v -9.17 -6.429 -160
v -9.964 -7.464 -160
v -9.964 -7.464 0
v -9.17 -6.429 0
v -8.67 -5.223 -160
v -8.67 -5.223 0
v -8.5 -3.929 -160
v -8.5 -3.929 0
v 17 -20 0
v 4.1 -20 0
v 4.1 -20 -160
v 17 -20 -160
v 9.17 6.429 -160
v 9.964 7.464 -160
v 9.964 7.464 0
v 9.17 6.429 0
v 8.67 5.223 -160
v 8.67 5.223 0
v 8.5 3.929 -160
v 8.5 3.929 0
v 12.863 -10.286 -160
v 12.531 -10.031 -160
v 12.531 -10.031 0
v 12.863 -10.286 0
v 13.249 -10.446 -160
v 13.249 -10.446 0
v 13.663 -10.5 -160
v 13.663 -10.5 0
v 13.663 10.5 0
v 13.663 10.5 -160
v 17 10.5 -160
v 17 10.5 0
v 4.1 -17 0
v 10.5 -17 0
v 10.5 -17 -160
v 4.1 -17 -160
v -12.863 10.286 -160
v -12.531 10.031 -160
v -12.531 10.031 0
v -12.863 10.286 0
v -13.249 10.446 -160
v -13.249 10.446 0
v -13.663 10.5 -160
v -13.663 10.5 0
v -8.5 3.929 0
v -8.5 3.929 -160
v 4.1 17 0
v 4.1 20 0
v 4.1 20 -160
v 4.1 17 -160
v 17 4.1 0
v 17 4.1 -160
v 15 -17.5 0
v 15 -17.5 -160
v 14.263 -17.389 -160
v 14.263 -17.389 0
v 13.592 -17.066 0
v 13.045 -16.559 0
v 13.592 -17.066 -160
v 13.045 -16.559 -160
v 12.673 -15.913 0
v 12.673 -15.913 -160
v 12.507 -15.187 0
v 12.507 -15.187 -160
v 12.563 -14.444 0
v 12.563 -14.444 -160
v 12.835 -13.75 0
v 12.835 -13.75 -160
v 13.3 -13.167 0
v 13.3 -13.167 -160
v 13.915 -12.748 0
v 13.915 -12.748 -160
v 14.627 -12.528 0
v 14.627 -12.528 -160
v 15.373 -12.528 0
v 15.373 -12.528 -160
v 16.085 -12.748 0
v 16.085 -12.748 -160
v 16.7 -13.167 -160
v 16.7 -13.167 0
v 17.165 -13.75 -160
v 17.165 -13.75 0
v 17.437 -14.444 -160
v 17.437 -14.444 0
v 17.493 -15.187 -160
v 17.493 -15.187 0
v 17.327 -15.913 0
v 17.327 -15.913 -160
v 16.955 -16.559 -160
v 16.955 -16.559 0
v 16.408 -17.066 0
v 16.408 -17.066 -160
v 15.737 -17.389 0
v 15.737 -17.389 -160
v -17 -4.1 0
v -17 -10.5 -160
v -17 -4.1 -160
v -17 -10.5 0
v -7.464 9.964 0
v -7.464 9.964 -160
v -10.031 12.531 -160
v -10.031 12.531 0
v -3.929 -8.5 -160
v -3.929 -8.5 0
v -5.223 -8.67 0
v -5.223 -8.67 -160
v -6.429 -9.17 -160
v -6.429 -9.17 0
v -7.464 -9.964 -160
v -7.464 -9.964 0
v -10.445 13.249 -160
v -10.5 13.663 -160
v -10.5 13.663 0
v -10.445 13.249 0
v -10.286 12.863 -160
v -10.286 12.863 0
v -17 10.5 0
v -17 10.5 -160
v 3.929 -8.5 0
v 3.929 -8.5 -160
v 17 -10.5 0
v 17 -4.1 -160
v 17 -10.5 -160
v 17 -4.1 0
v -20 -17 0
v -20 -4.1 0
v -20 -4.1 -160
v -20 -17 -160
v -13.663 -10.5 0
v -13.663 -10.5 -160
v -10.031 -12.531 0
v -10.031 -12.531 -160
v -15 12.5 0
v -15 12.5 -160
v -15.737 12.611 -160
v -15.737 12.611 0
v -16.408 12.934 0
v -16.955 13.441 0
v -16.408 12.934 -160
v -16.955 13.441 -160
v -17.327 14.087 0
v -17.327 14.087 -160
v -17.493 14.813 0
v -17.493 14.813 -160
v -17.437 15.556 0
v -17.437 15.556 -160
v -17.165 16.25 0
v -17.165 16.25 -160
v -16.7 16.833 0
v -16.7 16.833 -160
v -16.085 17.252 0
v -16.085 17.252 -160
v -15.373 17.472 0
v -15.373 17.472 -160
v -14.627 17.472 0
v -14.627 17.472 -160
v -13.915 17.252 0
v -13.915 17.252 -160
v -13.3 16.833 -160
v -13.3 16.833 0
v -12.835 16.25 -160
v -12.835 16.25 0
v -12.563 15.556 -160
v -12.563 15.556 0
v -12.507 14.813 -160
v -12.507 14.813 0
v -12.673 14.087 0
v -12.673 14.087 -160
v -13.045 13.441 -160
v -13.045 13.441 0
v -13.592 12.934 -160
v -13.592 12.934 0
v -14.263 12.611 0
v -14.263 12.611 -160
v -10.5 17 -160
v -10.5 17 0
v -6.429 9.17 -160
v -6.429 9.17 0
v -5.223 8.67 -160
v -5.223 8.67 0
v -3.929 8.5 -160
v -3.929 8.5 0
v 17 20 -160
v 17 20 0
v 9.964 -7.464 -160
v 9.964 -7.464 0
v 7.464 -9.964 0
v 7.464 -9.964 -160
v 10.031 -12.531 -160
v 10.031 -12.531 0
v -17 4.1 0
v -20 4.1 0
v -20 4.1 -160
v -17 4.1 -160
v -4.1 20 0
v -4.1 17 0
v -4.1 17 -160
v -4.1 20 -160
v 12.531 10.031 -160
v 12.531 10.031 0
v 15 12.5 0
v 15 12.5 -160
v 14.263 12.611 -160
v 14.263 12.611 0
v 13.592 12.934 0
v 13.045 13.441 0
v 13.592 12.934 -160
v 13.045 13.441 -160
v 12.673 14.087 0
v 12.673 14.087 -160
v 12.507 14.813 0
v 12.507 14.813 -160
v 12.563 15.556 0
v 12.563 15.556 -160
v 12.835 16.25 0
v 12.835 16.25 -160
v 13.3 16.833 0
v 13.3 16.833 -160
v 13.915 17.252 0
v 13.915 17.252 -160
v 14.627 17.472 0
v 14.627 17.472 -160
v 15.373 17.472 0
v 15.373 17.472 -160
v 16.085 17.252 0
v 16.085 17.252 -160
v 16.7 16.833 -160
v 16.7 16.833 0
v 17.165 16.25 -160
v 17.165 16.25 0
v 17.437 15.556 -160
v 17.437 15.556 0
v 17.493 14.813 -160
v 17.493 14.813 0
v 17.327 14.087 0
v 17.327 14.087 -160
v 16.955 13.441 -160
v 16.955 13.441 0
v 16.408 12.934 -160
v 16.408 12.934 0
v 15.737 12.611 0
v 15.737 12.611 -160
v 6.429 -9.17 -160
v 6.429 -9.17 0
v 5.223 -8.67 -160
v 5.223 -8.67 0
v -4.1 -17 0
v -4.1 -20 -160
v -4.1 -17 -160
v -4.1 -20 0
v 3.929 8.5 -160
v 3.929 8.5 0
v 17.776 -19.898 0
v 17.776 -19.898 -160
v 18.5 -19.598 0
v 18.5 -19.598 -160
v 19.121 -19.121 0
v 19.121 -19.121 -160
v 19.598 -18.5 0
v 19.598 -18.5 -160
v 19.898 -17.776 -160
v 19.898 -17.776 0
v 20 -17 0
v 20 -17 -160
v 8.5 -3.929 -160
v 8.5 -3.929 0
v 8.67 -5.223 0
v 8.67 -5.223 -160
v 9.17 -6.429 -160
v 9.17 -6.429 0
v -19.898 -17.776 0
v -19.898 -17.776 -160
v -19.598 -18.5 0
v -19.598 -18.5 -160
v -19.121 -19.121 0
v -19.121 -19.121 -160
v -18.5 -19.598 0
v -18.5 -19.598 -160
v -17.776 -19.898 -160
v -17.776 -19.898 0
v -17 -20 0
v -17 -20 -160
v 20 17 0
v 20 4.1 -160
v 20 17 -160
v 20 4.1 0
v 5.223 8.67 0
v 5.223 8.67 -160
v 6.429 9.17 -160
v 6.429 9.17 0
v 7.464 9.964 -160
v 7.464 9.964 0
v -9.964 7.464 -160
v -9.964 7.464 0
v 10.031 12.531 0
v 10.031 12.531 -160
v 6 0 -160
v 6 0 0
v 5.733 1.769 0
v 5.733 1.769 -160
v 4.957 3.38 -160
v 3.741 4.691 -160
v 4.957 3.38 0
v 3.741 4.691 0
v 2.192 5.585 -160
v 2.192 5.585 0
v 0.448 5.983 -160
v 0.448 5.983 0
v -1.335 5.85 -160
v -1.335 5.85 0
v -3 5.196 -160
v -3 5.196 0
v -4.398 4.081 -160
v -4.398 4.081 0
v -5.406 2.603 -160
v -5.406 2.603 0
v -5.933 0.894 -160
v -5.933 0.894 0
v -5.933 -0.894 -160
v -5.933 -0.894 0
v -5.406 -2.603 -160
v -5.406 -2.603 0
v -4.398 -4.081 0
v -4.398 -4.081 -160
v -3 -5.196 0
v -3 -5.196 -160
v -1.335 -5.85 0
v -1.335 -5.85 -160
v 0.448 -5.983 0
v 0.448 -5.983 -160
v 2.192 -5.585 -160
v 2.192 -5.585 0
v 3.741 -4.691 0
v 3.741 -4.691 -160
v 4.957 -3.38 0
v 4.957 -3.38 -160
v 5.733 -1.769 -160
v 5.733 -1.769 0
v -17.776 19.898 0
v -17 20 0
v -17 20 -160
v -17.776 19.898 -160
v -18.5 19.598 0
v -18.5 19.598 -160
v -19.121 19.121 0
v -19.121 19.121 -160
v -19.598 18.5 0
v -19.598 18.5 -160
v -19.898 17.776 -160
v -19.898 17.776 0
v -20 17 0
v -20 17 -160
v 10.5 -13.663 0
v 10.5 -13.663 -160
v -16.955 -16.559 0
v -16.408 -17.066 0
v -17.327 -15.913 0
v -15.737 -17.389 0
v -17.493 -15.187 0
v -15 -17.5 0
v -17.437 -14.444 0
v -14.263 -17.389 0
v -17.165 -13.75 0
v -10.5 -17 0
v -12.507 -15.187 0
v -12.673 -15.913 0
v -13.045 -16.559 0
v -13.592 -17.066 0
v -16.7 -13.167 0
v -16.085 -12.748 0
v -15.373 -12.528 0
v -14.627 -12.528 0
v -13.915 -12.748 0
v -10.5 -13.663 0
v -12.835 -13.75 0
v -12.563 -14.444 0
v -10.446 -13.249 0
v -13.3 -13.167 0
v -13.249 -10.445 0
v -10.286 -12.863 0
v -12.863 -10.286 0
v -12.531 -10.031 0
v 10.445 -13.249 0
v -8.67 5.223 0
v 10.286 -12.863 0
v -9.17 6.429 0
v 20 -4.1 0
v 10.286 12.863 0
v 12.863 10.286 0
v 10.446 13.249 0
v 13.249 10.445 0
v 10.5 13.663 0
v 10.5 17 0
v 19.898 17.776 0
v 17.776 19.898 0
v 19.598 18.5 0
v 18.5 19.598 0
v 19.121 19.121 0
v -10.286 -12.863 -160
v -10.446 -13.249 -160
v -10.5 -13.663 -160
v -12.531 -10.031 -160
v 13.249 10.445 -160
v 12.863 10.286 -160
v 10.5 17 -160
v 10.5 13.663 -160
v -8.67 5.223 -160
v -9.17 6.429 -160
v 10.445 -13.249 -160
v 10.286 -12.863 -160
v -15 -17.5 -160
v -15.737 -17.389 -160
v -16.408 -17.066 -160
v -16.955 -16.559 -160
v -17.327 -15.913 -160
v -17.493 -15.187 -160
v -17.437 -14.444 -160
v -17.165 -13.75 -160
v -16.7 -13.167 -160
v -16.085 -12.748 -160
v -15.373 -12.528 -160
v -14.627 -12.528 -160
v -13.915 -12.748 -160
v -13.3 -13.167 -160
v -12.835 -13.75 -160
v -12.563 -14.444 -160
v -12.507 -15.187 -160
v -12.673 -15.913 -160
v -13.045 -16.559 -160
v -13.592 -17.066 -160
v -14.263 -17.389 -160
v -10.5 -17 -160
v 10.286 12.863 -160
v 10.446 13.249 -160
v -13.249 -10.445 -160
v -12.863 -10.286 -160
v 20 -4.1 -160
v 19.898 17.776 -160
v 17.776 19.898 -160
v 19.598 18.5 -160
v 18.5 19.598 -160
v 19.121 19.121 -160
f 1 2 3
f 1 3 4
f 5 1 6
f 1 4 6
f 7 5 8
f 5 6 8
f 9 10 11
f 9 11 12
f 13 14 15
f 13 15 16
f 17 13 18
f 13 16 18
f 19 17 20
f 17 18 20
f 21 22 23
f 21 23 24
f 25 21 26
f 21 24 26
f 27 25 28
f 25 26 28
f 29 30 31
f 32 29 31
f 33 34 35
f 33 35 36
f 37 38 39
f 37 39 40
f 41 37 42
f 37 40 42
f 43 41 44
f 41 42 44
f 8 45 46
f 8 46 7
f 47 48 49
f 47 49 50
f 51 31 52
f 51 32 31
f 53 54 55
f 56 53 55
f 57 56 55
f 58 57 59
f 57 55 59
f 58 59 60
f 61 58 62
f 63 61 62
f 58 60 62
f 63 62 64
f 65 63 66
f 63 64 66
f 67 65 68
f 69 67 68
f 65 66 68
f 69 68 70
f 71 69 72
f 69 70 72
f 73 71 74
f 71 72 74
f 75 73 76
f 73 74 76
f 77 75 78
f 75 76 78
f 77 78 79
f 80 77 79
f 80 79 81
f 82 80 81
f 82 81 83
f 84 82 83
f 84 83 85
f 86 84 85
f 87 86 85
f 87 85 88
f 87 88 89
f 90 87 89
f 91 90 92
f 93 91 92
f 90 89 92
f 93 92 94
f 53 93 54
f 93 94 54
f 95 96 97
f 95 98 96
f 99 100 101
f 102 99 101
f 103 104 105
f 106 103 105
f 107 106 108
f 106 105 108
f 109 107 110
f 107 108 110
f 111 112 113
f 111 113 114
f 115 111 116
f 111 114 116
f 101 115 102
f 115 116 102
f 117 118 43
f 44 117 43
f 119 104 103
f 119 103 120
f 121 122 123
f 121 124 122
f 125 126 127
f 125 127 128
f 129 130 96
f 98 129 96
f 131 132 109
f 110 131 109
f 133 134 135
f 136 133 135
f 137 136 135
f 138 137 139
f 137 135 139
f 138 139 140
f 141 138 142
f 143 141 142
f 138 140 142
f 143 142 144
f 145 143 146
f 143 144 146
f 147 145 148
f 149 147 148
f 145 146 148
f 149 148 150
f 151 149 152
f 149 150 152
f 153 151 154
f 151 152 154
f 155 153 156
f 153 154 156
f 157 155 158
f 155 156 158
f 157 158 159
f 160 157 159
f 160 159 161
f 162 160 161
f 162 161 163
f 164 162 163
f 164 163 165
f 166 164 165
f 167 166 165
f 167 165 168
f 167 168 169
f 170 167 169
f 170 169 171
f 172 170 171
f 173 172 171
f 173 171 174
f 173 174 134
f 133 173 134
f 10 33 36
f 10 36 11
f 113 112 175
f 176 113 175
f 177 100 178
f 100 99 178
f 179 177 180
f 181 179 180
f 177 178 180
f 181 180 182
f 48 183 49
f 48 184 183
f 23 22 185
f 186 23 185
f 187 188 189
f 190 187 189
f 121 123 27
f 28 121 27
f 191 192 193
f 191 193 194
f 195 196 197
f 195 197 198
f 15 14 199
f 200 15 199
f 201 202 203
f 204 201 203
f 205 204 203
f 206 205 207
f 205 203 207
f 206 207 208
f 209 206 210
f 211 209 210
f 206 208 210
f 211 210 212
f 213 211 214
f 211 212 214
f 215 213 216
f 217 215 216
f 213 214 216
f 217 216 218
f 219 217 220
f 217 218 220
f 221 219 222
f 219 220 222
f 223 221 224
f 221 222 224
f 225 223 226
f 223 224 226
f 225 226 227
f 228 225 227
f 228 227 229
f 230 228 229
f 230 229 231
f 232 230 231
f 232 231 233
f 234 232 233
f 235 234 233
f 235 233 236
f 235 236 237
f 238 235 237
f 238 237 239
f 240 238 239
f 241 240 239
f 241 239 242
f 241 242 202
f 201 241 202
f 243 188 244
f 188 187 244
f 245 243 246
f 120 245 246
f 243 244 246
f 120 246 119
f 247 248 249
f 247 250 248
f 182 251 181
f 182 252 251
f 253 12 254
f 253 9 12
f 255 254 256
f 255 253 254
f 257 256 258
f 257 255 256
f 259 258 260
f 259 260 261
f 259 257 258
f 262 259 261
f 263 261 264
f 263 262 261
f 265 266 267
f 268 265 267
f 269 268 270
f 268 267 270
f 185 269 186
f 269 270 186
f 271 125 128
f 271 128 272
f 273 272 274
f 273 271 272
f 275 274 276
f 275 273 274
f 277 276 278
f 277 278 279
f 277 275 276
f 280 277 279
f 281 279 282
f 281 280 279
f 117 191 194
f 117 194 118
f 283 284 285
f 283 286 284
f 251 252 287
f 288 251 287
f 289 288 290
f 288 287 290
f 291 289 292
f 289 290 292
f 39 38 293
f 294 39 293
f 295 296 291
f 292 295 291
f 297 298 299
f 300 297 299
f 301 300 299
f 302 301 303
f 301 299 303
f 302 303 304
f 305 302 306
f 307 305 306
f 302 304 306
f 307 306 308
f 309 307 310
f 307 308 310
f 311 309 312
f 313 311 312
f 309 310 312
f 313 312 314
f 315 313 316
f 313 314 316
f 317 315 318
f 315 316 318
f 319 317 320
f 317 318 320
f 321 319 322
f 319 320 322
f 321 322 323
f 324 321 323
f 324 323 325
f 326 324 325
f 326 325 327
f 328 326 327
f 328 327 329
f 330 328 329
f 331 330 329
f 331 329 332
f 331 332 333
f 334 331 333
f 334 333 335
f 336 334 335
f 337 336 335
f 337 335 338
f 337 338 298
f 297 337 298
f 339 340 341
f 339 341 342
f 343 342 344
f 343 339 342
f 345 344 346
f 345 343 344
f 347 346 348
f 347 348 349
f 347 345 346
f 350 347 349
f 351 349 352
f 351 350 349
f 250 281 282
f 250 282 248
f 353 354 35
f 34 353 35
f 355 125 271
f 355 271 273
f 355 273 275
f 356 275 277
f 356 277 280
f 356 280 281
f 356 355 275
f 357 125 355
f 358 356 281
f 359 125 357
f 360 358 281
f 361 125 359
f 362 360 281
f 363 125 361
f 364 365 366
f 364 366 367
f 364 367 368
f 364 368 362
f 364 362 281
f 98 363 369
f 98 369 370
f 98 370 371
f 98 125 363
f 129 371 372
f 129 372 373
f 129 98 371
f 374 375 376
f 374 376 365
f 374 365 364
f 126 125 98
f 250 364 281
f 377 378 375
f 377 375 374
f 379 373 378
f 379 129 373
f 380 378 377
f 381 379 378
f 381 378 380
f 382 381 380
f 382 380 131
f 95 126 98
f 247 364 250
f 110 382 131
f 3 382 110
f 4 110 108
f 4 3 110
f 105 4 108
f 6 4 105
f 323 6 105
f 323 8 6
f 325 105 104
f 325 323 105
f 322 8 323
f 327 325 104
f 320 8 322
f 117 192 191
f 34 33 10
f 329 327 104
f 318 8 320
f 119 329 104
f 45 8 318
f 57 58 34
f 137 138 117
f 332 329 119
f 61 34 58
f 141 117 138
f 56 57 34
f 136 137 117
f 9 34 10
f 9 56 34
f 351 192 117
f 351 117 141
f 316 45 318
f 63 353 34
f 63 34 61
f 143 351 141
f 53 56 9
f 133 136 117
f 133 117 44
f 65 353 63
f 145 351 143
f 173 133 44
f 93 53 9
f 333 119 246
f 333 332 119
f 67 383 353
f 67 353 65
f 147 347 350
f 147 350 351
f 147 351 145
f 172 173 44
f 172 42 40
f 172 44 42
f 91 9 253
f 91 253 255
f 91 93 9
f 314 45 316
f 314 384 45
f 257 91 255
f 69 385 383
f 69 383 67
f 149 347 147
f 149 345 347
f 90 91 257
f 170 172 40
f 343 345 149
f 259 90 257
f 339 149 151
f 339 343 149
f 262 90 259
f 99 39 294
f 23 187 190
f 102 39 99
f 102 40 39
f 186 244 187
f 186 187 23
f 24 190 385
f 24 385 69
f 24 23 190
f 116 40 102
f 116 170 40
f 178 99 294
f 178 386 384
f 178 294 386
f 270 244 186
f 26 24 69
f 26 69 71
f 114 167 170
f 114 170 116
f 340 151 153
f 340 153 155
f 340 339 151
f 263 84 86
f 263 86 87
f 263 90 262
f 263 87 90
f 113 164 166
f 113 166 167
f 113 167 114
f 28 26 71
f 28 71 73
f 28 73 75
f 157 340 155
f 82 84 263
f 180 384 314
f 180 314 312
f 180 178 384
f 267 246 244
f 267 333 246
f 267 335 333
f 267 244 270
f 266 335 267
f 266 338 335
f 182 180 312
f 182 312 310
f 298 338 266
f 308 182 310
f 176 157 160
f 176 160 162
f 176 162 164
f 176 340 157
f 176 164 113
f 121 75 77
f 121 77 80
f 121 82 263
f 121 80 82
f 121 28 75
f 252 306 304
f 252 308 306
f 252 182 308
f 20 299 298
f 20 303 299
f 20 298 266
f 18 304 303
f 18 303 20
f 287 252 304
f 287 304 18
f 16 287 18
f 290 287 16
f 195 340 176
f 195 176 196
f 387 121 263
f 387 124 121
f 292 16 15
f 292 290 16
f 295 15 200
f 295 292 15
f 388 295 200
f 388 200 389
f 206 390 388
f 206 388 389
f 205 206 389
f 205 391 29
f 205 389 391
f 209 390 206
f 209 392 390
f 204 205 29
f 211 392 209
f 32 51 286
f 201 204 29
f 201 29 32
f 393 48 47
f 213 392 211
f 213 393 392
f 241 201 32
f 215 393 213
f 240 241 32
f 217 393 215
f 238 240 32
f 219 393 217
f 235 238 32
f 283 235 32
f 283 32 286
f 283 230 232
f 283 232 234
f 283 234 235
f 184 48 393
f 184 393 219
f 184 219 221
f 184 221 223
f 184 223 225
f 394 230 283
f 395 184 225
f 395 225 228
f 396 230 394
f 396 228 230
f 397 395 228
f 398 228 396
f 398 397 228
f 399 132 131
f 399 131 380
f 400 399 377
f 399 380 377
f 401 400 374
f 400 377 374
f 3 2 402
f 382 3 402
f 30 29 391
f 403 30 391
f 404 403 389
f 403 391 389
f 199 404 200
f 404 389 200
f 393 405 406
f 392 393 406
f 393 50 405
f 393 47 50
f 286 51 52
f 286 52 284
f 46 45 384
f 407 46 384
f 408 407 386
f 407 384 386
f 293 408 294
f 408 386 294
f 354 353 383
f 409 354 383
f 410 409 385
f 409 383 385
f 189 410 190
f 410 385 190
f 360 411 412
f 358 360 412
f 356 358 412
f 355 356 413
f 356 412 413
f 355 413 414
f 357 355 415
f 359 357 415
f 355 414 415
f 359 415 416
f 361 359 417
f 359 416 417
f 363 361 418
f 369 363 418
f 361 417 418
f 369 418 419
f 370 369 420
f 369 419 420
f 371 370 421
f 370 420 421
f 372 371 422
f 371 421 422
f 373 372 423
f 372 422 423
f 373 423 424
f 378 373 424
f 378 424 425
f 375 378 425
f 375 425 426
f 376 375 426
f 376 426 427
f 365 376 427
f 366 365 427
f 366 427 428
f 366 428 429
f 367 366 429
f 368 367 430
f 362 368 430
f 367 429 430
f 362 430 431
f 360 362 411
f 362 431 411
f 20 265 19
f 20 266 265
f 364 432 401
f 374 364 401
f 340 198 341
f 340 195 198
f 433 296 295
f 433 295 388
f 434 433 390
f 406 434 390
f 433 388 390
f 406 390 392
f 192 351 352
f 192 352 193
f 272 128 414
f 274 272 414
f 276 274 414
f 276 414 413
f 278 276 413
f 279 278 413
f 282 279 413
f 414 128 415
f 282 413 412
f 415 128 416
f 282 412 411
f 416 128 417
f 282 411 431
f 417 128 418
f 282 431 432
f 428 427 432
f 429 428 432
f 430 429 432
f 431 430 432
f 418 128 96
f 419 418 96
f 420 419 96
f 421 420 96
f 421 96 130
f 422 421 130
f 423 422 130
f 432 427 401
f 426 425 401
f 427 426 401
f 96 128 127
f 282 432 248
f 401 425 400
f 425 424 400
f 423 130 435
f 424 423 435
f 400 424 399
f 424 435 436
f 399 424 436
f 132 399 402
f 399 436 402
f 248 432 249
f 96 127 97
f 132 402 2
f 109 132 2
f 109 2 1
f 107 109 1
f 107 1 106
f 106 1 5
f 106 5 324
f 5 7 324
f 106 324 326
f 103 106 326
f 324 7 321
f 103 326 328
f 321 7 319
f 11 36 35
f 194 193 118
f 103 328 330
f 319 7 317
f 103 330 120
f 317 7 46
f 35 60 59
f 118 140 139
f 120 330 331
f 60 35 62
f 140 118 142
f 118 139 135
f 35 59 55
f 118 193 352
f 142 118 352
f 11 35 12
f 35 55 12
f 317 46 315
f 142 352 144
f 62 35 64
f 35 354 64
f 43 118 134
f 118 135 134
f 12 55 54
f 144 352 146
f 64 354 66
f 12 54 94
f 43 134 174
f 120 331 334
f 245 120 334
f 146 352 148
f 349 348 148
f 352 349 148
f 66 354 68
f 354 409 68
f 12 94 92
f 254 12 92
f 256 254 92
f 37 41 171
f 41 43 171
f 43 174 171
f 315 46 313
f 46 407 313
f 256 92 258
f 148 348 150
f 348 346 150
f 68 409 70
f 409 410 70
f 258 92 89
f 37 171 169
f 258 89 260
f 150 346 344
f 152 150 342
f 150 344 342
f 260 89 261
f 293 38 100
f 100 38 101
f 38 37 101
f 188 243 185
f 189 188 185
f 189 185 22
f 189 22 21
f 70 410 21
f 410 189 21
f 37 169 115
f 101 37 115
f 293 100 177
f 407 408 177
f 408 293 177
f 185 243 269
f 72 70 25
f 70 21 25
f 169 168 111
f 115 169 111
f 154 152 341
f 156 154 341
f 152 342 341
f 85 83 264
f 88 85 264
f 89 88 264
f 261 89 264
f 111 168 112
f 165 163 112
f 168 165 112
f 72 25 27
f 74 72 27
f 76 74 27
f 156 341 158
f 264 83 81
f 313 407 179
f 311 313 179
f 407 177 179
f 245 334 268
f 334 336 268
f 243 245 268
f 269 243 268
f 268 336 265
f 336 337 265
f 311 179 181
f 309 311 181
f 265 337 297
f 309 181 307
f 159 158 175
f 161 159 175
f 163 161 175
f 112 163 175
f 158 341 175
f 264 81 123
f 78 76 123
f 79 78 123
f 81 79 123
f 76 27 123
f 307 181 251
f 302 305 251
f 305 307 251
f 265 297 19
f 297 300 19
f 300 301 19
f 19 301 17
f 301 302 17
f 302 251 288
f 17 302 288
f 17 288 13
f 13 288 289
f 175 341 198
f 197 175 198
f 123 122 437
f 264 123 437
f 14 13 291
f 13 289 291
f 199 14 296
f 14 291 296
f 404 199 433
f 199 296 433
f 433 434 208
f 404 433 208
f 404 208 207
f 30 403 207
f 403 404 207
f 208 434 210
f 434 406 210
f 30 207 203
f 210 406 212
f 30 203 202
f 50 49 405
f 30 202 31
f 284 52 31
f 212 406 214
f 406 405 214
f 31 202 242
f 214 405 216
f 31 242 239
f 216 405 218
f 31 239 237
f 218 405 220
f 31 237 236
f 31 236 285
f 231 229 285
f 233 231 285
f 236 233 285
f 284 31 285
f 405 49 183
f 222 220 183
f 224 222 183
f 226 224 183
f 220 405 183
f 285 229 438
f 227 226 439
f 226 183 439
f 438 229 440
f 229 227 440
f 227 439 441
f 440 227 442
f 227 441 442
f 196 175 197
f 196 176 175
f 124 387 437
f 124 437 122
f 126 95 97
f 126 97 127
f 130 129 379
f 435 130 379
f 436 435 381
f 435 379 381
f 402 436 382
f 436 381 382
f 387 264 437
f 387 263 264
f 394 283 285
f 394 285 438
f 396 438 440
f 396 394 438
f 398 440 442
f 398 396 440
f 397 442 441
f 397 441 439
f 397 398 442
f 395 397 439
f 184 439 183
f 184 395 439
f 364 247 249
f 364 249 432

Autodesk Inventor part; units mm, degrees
sketch "Skizze_1" plane through (0, 0, 0) normal (0, 0, 1) x (1, 0, 0)
  arc A0 (-20, -17) -> (-17, -20) centre (-17, -17) ccw
  line L0 (-17, -20) -> (-4.1, -20)
  line L1 (-4.1, -20) -> (-4.1, -17)
  line L2 (-4.1, -17) -> (-10.5, -17)
  line L3 (-10.5, -17) -> (-10.5, -13.6627)
  arc A1 (-10.0314, -12.5314) -> (-10.5, -13.6627) centre (-8.9002, -13.6627) ccw
  line L4 (-10.0314, -12.5314) -> (-7.4645, -9.9645)
  arc A2 (-3.9289, -8.5) -> (-7.4645, -9.9645) centre (-3.9289, -13.5) ccw
  line L5 (-3.9289, -8.5) -> (3.9289, -8.5)
  arc A3 (7.4645, -9.9645) -> (3.9289, -8.5) centre (3.9289, -13.5) ccw
  line L6 (7.4645, -9.9645) -> (10.0314, -12.5314)
  arc A4 (10.5, -13.6627) -> (10.0314, -12.5314) centre (8.9002, -13.6627) ccw
  line L7 (10.5, -13.6627) -> (10.5, -17)
  line L8 (10.5, -17) -> (4.1, -17)
  line L9 (4.1, -17) -> (4.1, -20)
  line L10 (4.1, -20) -> (17, -20)
  arc A5 (17, -20) -> (20, -17) centre (17, -17) ccw
  line L11 (20, -17) -> (20, -4.1)
  line L12 (20, -4.1) -> (17, -4.1)
  line L13 (17, -4.1) -> (17, -10.5)
  line L14 (17, -10.5) -> (13.6627, -10.5)
  arc A6 (12.5314, -10.0314) -> (13.6627, -10.5) centre (13.6627, -8.9002) ccw
  line L15 (12.5314, -10.0314) -> (9.9645, -7.4645)
  arc A7 (8.5, -3.9289) -> (9.9645, -7.4645) centre (13.5, -3.9289) ccw
  line L16 (8.5, -3.9289) -> (8.5, 3.9289)
  arc A8 (9.9645, 7.4645) -> (8.5, 3.9289) centre (13.5, 3.9289) ccw
  line L17 (9.9645, 7.4645) -> (12.5314, 10.0314)
  arc A9 (13.6627, 10.5) -> (12.5314, 10.0314) centre (13.6627, 8.9002) ccw
  line L18 (13.6627, 10.5) -> (17, 10.5)
  line L19 (17, 10.5) -> (17, 4.1)
  line L20 (17, 4.1) -> (20, 4.1)
  line L21 (20, 4.1) -> (20, 17)
  arc A10 (20, 17) -> (17, 20) centre (17, 17) ccw
  line L22 (17, 20) -> (4.1, 20)
  line L23 (4.1, 20) -> (4.1, 17)
  line L24 (4.1, 17) -> (10.5, 17)
  line L25 (10.5, 17) -> (10.5, 13.6627)
  arc A11 (10.0314, 12.5314) -> (10.5, 13.6627) centre (8.9002, 13.6627) ccw
  line L26 (10.0314, 12.5314) -> (7.4645, 9.9645)
  arc A12 (3.9289, 8.5) -> (7.4645, 9.9645) centre (3.9289, 13.5) ccw
  line L27 (3.9289, 8.5) -> (-3.9289, 8.5)
  arc A13 (-7.4645, 9.9645) -> (-3.9289, 8.5) centre (-3.9289, 13.5) ccw
  line L28 (-7.4645, 9.9645) -> (-10.0314, 12.5314)
  arc A14 (-10.5, 13.6627) -> (-10.0314, 12.5314) centre (-8.9002, 13.6627) ccw
  line L29 (-10.5, 13.6627) -> (-10.5, 17)
  line L30 (-10.5, 17) -> (-4.1, 17)
  line L31 (-4.1, 17) -> (-4.1, 20)
  line L32 (-4.1, 20) -> (-17, 20)
  arc A15 (-17, 20) -> (-20, 17) centre (-17, 17) ccw
  line L33 (-20, 17) -> (-20, 4.1)
  line L34 (-20, 4.1) -> (-17, 4.1)
  line L35 (-17, 4.1) -> (-17, 10.5)
  line L36 (-17, 10.5) -> (-13.6627, 10.5)
  arc A16 (-12.5314, 10.0314) -> (-13.6627, 10.5) centre (-13.6627, 8.9002) ccw
  line L37 (-12.5314, 10.0314) -> (-9.9645, 7.4645)
  arc A17 (-8.5, 3.9289) -> (-9.9645, 7.4645) centre (-13.5, 3.9289) ccw
  line L38 (-8.5, 3.9289) -> (-8.5, -3.9289)
  arc A18 (-9.9645, -7.4645) -> (-8.5, -3.9289) centre (-13.5, -3.9289) ccw
  line L39 (-9.9645, -7.4645) -> (-12.5314, -10.0314)
  arc A19 (-13.6627, -10.5) -> (-12.5314, -10.0314) centre (-13.6627, -8.9002) ccw
  line L40 (-13.6627, -10.5) -> (-17, -10.5)
  line L41 (-17, -10.5) -> (-17, -4.1)
  line L42 (-17, -4.1) -> (-20, -4.1)
  line L43 (-20, -4.1) -> (-20, -17)
  circle A20 centre (0, 0) radius 6
extrude "Extrusion1" add sketch "Skizze_1" against normal blind 160
sketch "Sketch2" plane through (0, 0, 0) normal (0, 0, 1) x (1, 0, 0)
  point P0 (-15, -15)
hole "Drilling 1" at (-15, -15, 0) direction (0, 0, -1) diameter 5 depth 6000
sketch "Sketch3" plane through (0, 0, 0) normal (0, 0, 1) x (1, 0, 0)
  point P0 (15, -15)
hole "Drilling 2" at (15, -15, 0) direction (0, 0, -1) diameter 5 depth 6000
sketch "Sketch4" plane through (0, 0, 0) normal (0, 0, 1) x (1, 0, 0)
  point P0 (15, 15)
hole "Drilling 3" at (15, 15, 0) direction (0, 0, -1) diameter 5 depth 6000
sketch "Sketch5" plane through (0, 0, 0) normal (0, 0, 1) x (1, 0, 0)
  point P0 (-15, 15)
hole "Drilling 4" at (-15, 15, 0) direction (0, 0, -1) diameter 5 depth 6000
ref_plane "side_4d_XY" through (-20, 0, -165) normal (-1, 0, 0) x (0, 1, 0)
ref_plane "side_4d_YZ" through (-20, 0, -165) normal (0, 1, 0) x (0, 0, -1)
ref_plane "side_4d_ZX" through (-20, 0, -165) normal (0, 0, -1) x (-1, 0, 0)
ref_plane "side_1a_XY" through (0, 20, -165) normal (0, 1, 0) x (1, 0, 0)
ref_plane "side_1a_YZ" through (0, 20, -165) normal (1, 0, 0) x (0, 0, -1)
ref_plane "side_1a_ZX" through (0, 20, -165) normal (0, 0, -1) x (0, 1, 0)
ref_plane "side_2b_XY" through (20, 0, -165) normal (1, 0, 0) x (0, -1, 0)
ref_plane "side_2b_YZ" through (20, 0, -165) normal (0, -1, 0) x (0, 0, -1)
ref_plane "side_2b_ZX" through (20, 0, -165) normal (0, 0, -1) x (1, 0, 0)
ref_plane "side_3c_XY" through (0, -20, -165) normal (0, -1, 0) x (-1, 0, 0)
ref_plane "side_3c_YZ" through (0, -20, -165) normal (-1, 0, 0) x (0, 0, -1)
ref_plane "side_3c_ZX" through (0, -20, -165) normal (0, 0, -1) x (0, -1, 0)
ref_plane "end_XY" through (0, 0, -330) normal (0, 0, -1) x (1, 0, 0)
ref_plane "end_YZ" through (0, 0, -330) normal (1, 0, 0) x (0, -1, 0)
ref_plane "end_ZX" through (0, 0, -330) normal (0, -1, 0) x (0, 0, -1)
ref_plane "start_XY" through (0, 0, 0) normal (0, 0, 1) x (1, 0, 0)
ref_plane "start_YZ" through (0, 0, 0) normal (1, 0, 0) x (0, 1, 0)
ref_plane "start_ZX" through (0, 0, 0) normal (0, 1, 0) x (0, 0, 1)
properties part number "MayTec 1_11_040040_43S_Profile 40x40, 4E, S_160_Detail_(0;0,0,0)"
